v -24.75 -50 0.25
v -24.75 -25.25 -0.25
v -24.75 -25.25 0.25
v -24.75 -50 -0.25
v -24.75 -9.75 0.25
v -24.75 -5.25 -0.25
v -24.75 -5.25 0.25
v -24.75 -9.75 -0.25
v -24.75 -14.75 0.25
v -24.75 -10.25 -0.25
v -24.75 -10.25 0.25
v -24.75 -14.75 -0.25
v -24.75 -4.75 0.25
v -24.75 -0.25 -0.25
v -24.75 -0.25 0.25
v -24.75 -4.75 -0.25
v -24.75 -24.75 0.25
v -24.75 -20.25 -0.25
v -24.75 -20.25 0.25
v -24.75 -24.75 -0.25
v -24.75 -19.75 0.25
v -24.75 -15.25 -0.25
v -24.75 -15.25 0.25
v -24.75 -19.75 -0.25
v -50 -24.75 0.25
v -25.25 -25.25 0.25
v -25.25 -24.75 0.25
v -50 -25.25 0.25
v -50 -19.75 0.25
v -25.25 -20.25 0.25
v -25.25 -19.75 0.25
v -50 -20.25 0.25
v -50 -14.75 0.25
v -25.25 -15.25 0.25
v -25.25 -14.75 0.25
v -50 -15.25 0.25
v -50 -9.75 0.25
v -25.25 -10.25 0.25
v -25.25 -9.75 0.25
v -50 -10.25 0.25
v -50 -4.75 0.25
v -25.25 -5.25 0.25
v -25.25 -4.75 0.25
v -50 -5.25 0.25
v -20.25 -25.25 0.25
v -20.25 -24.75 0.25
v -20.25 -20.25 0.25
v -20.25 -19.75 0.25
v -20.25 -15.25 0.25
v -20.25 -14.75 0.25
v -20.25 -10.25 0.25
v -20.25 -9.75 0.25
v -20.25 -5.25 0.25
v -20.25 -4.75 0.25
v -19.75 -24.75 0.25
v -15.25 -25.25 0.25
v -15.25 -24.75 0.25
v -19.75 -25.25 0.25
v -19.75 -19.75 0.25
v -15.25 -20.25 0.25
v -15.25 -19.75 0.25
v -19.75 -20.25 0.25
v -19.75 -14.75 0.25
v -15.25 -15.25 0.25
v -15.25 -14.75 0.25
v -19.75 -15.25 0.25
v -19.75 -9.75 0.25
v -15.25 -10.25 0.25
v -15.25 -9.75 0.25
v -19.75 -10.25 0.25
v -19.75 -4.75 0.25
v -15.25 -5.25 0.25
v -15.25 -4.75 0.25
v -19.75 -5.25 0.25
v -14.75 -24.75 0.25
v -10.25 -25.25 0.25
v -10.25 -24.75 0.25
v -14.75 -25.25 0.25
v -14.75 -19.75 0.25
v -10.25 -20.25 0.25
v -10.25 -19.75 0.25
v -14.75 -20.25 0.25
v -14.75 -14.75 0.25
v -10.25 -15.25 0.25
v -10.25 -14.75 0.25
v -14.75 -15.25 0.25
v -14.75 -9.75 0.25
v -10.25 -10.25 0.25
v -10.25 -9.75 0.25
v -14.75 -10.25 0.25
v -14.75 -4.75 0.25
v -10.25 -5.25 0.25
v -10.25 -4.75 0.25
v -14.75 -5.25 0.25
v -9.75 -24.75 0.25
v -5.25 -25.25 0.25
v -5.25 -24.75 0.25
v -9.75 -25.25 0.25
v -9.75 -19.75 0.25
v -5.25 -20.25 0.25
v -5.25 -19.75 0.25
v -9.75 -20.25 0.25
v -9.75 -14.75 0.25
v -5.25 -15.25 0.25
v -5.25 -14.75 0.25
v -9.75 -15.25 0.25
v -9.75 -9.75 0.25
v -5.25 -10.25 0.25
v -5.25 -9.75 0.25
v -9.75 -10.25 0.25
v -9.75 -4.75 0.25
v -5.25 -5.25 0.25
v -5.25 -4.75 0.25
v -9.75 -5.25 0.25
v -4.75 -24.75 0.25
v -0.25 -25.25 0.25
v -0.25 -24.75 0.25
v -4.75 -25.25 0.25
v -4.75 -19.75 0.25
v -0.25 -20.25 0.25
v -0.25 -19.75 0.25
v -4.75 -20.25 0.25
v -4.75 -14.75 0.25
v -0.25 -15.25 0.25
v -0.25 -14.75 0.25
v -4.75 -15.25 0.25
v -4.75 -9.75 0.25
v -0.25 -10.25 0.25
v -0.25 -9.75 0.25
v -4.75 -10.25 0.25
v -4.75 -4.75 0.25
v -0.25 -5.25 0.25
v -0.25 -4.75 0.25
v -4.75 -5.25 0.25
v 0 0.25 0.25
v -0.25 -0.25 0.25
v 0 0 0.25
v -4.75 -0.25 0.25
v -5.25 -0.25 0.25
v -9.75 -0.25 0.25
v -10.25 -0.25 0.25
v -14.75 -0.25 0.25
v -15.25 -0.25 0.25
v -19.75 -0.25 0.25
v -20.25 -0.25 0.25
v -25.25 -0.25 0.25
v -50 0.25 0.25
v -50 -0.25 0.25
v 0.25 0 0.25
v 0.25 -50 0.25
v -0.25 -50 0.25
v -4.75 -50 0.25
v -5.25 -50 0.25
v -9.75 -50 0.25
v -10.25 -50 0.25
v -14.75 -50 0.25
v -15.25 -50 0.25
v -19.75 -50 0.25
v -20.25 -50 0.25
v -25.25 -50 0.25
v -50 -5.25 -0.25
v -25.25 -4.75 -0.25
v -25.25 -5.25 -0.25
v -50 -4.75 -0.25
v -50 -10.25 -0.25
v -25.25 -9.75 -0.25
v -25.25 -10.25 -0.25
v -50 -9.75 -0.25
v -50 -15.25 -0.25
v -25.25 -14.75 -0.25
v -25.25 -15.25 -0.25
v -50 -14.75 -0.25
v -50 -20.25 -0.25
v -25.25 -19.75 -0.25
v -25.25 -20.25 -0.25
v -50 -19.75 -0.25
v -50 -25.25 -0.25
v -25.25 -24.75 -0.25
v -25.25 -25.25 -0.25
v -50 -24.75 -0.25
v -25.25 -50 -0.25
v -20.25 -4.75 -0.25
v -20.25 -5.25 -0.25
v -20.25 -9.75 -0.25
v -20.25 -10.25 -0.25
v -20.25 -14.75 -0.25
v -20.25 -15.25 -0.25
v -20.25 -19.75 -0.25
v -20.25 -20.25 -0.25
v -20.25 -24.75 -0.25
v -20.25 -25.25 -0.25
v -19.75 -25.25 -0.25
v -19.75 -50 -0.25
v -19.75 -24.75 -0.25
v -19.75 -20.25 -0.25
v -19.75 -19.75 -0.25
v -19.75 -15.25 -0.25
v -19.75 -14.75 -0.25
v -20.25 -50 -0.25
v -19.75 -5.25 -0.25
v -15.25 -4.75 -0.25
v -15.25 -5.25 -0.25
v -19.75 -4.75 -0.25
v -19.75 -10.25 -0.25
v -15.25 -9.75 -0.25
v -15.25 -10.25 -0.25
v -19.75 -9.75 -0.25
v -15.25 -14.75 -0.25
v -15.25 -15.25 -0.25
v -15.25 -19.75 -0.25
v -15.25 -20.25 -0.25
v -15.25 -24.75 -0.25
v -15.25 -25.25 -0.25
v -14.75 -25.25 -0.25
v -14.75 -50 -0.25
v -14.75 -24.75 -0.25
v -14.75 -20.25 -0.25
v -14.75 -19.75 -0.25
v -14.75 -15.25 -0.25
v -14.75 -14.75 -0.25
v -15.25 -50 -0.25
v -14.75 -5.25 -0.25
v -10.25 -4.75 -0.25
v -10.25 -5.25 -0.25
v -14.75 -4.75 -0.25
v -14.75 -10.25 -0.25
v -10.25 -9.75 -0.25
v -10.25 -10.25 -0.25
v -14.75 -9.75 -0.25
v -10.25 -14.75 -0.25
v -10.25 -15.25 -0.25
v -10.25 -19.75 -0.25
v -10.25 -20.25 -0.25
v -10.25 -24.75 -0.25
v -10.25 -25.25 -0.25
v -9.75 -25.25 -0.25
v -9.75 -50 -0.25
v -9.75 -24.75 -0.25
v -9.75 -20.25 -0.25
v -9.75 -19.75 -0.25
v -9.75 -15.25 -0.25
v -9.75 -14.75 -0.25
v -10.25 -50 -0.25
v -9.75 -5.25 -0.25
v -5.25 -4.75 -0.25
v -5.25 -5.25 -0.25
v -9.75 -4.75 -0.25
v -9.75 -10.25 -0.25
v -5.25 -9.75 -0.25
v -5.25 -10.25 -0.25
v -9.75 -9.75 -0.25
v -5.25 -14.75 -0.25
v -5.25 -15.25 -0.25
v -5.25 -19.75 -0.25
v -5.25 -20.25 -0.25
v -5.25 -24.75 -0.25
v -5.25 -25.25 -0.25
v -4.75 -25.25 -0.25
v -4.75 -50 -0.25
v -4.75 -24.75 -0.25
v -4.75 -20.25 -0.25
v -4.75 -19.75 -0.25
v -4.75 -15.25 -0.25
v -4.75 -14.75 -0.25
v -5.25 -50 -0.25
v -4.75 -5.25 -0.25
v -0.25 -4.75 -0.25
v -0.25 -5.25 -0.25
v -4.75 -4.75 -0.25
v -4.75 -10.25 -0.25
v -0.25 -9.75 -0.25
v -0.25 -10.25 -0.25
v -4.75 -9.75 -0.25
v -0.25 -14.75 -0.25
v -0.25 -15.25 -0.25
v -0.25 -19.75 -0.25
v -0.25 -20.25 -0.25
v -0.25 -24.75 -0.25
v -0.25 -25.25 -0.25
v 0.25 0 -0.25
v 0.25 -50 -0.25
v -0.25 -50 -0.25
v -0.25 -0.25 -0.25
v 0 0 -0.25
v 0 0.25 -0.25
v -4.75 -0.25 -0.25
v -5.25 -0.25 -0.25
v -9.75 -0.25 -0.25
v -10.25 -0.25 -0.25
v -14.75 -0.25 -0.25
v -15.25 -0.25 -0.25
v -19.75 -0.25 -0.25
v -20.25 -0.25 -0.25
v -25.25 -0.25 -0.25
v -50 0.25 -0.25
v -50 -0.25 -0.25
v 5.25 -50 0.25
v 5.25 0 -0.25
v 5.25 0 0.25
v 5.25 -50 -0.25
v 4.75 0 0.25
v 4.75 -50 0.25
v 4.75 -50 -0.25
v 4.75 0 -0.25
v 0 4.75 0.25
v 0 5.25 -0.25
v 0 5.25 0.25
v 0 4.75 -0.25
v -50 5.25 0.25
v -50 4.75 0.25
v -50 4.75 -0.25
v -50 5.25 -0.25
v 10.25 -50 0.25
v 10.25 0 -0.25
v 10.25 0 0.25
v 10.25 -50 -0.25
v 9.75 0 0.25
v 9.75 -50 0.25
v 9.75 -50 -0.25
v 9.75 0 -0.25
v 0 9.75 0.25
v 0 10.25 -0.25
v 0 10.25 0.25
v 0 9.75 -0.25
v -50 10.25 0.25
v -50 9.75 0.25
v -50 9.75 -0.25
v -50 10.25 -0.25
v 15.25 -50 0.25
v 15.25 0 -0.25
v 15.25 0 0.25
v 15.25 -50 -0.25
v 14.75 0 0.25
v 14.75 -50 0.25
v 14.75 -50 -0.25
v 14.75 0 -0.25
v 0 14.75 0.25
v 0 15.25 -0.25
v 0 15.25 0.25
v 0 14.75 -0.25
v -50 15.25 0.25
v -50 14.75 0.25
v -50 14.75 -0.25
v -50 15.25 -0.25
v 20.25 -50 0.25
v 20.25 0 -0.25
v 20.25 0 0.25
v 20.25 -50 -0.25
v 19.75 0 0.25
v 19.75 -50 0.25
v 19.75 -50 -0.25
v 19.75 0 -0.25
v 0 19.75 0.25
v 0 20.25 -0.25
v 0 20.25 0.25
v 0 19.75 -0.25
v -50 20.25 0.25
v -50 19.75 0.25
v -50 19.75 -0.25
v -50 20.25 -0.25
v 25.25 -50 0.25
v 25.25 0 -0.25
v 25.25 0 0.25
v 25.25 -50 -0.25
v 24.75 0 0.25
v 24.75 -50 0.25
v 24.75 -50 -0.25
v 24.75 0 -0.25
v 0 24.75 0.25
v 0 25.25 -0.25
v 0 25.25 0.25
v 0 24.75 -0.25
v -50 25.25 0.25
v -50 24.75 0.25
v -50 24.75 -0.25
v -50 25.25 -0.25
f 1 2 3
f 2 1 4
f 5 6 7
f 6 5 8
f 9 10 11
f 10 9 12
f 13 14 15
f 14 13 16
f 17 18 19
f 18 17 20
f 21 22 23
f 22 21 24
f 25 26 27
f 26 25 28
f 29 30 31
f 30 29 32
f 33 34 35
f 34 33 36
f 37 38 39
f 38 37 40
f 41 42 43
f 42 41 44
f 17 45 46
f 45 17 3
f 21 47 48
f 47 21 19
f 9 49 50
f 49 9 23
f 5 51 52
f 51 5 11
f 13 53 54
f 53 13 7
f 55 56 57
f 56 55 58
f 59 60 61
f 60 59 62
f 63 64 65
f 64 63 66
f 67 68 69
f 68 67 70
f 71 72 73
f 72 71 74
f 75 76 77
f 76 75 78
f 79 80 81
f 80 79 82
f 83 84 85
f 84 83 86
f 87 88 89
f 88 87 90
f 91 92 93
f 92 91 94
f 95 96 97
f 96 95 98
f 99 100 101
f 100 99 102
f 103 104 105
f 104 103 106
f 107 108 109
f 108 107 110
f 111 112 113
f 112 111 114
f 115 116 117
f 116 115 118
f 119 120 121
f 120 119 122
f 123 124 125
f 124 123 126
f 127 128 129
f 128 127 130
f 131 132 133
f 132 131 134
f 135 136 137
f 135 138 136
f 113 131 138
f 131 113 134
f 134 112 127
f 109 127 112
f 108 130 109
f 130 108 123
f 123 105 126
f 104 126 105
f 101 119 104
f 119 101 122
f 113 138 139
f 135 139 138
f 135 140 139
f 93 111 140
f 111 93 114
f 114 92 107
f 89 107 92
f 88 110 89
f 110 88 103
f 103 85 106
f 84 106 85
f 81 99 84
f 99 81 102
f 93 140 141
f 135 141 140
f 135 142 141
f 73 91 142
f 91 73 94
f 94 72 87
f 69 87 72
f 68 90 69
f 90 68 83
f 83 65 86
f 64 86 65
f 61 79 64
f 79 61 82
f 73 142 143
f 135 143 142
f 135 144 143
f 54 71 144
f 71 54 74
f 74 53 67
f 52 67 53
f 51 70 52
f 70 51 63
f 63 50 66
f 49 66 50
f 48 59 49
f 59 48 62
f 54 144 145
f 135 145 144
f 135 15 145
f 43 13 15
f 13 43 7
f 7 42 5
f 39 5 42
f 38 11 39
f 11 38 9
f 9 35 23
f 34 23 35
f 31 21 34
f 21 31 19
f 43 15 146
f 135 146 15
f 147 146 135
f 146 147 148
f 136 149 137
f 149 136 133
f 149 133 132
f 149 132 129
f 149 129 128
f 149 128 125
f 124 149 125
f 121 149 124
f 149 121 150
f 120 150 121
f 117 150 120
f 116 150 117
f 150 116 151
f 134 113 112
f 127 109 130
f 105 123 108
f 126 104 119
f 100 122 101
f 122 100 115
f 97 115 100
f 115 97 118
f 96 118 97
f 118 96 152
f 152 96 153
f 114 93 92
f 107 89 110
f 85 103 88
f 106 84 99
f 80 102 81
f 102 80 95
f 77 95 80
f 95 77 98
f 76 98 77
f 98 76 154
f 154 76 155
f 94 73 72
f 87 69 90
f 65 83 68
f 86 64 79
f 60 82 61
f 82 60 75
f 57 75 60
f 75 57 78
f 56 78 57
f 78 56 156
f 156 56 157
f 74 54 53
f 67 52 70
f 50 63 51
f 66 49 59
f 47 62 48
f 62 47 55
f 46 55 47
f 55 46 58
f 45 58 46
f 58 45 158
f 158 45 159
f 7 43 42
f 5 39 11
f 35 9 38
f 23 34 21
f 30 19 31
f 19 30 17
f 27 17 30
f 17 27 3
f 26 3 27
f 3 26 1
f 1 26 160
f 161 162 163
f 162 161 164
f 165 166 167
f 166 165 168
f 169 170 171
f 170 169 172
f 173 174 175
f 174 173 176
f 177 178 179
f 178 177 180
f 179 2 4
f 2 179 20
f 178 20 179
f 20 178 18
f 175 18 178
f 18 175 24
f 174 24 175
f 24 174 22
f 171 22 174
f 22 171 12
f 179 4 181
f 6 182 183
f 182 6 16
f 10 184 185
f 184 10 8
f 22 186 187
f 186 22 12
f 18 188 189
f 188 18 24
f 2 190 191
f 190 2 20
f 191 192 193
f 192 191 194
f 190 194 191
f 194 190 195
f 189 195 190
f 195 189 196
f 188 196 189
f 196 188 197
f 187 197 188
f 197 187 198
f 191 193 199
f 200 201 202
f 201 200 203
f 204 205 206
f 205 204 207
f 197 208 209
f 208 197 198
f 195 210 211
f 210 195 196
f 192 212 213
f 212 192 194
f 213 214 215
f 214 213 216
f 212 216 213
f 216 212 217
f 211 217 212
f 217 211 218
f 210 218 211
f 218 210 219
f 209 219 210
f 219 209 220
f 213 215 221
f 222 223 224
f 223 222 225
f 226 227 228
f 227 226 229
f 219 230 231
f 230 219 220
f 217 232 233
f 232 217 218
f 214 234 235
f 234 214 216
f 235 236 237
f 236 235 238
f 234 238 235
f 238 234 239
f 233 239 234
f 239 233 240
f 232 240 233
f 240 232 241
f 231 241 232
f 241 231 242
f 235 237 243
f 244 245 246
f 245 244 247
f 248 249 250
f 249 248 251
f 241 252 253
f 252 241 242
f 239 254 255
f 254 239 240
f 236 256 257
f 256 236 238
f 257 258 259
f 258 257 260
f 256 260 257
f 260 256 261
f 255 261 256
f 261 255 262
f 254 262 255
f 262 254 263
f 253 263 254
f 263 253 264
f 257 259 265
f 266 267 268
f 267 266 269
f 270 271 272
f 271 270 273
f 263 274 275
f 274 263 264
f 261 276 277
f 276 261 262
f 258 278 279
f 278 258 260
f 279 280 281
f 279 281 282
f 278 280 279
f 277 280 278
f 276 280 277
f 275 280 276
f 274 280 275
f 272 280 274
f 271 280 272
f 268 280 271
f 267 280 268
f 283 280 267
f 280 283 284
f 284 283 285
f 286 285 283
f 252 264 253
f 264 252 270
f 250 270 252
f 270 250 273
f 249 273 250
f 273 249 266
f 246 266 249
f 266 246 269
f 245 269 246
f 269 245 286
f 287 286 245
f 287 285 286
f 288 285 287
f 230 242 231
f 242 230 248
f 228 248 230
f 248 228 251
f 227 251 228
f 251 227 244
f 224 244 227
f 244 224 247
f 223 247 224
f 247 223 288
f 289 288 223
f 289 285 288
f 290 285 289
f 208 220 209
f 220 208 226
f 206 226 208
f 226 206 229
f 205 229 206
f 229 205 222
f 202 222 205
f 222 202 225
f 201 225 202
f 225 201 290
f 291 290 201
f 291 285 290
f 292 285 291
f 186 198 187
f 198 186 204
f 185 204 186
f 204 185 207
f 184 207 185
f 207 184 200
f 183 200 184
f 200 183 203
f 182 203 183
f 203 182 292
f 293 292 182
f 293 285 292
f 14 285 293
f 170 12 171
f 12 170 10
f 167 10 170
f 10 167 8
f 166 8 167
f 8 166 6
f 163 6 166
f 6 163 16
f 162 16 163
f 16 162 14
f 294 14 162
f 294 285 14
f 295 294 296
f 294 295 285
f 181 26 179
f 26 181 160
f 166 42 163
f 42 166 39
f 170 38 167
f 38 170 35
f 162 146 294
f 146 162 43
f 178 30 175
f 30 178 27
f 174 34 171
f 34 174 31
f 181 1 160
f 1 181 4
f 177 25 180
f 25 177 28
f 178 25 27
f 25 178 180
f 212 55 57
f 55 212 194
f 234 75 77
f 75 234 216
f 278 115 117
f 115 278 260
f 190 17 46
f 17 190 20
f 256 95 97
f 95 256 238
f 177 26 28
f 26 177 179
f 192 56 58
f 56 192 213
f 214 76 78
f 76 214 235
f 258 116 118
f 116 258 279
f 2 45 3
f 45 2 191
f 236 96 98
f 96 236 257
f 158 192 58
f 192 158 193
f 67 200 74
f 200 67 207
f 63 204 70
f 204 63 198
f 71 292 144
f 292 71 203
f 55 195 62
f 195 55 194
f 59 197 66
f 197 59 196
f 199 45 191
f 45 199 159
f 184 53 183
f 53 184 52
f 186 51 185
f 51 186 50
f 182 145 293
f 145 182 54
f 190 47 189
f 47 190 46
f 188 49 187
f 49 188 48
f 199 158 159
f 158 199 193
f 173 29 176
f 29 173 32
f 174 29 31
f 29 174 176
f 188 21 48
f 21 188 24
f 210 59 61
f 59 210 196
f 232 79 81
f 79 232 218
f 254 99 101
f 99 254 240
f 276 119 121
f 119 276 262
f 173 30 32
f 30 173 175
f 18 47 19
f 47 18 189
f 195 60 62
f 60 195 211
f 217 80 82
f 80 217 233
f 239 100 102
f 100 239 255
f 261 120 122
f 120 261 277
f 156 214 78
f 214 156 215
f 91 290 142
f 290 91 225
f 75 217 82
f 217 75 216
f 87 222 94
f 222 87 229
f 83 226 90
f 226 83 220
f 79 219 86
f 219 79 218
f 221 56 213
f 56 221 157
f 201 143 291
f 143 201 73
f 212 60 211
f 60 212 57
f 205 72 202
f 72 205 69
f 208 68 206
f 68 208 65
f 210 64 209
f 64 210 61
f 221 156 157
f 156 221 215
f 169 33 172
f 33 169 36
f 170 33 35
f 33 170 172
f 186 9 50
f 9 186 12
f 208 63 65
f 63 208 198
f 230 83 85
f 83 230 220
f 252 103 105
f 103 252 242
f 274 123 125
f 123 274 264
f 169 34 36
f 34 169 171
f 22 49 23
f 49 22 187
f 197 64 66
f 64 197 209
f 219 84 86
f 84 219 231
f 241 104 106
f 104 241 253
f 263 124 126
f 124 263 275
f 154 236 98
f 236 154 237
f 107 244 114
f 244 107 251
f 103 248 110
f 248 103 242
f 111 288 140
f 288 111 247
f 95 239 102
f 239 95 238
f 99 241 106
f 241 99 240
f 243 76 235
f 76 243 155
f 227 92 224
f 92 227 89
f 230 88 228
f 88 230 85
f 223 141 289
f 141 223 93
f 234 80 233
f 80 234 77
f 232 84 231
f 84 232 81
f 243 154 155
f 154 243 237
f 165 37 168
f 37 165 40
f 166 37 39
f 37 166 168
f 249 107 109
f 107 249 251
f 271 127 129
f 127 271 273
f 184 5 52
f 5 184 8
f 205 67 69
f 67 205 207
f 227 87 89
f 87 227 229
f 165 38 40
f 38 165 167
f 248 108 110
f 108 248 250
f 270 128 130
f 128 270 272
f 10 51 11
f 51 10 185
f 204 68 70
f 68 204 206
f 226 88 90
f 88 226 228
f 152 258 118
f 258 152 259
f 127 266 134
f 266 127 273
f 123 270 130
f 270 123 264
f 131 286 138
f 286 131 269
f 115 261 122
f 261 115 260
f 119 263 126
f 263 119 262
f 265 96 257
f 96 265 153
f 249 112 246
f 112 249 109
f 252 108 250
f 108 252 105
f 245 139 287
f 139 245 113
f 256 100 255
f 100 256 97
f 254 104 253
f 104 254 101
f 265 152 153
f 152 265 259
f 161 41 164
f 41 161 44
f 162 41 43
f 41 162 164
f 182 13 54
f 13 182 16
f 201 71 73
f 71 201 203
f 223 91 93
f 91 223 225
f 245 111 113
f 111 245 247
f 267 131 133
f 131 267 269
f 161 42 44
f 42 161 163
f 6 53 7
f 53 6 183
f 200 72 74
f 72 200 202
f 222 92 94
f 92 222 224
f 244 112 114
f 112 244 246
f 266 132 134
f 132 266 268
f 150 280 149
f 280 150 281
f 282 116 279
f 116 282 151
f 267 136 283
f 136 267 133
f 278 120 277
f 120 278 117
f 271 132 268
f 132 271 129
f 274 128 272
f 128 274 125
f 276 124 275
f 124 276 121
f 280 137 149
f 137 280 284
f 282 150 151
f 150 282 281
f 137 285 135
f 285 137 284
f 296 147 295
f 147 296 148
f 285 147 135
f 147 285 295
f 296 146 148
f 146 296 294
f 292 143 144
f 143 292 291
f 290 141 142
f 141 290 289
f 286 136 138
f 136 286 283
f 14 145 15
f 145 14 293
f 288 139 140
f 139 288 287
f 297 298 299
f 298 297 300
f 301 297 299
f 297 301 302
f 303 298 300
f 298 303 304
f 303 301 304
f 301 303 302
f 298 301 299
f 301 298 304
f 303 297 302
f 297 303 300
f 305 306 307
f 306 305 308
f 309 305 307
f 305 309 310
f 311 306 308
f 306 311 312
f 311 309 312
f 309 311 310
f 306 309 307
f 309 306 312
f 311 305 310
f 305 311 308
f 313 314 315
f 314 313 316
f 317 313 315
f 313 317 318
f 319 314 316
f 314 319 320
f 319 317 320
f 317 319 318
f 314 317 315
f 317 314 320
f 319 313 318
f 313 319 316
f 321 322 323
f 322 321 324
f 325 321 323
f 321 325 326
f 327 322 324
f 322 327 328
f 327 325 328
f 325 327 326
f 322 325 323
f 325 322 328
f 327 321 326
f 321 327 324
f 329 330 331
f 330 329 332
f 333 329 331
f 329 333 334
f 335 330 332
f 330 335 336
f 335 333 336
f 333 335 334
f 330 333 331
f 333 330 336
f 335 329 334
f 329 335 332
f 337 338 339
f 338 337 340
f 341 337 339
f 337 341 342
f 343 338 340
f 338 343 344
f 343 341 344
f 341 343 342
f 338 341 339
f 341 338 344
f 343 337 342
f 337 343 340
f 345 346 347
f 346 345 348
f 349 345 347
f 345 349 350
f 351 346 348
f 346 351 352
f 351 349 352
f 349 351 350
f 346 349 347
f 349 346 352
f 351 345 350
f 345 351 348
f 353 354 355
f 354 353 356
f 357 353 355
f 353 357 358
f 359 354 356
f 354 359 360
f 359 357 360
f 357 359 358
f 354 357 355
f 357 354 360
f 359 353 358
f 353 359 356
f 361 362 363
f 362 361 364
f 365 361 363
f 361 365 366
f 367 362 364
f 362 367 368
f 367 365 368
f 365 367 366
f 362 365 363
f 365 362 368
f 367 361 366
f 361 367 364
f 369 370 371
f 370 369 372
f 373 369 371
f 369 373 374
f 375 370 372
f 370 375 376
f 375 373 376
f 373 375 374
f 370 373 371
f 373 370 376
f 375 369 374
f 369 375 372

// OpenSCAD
// file: ../../lib/utilities/grid_generator.scad
// lib/utilities/grid_generator.scad

/**
 * Generates a grid of lines.
 *
 * @param size Size of the grid.
 * @param spacing Spacing between lines.
 * @param thickness Line thickness.
 */
module generateGrid(size = 100, spacing = 10, thickness = 1) {
    for (i = [-size/2 : spacing : size/2]) {
        translate([i, -size/2, 0])
        cube([thickness, size, thickness], center = true);
        translate([-size/2, i, 0])
        cube([size, thickness, thickness], center = true);
    }
}
// main file
// tests/utilities/test_grid_generator.scad

use <../../lib/utilities/grid_generator.scad>

module testGridGenerator() {
    generateGrid(size = 50, spacing = 5, thickness = 0.5);
}

testGridGenerator();
